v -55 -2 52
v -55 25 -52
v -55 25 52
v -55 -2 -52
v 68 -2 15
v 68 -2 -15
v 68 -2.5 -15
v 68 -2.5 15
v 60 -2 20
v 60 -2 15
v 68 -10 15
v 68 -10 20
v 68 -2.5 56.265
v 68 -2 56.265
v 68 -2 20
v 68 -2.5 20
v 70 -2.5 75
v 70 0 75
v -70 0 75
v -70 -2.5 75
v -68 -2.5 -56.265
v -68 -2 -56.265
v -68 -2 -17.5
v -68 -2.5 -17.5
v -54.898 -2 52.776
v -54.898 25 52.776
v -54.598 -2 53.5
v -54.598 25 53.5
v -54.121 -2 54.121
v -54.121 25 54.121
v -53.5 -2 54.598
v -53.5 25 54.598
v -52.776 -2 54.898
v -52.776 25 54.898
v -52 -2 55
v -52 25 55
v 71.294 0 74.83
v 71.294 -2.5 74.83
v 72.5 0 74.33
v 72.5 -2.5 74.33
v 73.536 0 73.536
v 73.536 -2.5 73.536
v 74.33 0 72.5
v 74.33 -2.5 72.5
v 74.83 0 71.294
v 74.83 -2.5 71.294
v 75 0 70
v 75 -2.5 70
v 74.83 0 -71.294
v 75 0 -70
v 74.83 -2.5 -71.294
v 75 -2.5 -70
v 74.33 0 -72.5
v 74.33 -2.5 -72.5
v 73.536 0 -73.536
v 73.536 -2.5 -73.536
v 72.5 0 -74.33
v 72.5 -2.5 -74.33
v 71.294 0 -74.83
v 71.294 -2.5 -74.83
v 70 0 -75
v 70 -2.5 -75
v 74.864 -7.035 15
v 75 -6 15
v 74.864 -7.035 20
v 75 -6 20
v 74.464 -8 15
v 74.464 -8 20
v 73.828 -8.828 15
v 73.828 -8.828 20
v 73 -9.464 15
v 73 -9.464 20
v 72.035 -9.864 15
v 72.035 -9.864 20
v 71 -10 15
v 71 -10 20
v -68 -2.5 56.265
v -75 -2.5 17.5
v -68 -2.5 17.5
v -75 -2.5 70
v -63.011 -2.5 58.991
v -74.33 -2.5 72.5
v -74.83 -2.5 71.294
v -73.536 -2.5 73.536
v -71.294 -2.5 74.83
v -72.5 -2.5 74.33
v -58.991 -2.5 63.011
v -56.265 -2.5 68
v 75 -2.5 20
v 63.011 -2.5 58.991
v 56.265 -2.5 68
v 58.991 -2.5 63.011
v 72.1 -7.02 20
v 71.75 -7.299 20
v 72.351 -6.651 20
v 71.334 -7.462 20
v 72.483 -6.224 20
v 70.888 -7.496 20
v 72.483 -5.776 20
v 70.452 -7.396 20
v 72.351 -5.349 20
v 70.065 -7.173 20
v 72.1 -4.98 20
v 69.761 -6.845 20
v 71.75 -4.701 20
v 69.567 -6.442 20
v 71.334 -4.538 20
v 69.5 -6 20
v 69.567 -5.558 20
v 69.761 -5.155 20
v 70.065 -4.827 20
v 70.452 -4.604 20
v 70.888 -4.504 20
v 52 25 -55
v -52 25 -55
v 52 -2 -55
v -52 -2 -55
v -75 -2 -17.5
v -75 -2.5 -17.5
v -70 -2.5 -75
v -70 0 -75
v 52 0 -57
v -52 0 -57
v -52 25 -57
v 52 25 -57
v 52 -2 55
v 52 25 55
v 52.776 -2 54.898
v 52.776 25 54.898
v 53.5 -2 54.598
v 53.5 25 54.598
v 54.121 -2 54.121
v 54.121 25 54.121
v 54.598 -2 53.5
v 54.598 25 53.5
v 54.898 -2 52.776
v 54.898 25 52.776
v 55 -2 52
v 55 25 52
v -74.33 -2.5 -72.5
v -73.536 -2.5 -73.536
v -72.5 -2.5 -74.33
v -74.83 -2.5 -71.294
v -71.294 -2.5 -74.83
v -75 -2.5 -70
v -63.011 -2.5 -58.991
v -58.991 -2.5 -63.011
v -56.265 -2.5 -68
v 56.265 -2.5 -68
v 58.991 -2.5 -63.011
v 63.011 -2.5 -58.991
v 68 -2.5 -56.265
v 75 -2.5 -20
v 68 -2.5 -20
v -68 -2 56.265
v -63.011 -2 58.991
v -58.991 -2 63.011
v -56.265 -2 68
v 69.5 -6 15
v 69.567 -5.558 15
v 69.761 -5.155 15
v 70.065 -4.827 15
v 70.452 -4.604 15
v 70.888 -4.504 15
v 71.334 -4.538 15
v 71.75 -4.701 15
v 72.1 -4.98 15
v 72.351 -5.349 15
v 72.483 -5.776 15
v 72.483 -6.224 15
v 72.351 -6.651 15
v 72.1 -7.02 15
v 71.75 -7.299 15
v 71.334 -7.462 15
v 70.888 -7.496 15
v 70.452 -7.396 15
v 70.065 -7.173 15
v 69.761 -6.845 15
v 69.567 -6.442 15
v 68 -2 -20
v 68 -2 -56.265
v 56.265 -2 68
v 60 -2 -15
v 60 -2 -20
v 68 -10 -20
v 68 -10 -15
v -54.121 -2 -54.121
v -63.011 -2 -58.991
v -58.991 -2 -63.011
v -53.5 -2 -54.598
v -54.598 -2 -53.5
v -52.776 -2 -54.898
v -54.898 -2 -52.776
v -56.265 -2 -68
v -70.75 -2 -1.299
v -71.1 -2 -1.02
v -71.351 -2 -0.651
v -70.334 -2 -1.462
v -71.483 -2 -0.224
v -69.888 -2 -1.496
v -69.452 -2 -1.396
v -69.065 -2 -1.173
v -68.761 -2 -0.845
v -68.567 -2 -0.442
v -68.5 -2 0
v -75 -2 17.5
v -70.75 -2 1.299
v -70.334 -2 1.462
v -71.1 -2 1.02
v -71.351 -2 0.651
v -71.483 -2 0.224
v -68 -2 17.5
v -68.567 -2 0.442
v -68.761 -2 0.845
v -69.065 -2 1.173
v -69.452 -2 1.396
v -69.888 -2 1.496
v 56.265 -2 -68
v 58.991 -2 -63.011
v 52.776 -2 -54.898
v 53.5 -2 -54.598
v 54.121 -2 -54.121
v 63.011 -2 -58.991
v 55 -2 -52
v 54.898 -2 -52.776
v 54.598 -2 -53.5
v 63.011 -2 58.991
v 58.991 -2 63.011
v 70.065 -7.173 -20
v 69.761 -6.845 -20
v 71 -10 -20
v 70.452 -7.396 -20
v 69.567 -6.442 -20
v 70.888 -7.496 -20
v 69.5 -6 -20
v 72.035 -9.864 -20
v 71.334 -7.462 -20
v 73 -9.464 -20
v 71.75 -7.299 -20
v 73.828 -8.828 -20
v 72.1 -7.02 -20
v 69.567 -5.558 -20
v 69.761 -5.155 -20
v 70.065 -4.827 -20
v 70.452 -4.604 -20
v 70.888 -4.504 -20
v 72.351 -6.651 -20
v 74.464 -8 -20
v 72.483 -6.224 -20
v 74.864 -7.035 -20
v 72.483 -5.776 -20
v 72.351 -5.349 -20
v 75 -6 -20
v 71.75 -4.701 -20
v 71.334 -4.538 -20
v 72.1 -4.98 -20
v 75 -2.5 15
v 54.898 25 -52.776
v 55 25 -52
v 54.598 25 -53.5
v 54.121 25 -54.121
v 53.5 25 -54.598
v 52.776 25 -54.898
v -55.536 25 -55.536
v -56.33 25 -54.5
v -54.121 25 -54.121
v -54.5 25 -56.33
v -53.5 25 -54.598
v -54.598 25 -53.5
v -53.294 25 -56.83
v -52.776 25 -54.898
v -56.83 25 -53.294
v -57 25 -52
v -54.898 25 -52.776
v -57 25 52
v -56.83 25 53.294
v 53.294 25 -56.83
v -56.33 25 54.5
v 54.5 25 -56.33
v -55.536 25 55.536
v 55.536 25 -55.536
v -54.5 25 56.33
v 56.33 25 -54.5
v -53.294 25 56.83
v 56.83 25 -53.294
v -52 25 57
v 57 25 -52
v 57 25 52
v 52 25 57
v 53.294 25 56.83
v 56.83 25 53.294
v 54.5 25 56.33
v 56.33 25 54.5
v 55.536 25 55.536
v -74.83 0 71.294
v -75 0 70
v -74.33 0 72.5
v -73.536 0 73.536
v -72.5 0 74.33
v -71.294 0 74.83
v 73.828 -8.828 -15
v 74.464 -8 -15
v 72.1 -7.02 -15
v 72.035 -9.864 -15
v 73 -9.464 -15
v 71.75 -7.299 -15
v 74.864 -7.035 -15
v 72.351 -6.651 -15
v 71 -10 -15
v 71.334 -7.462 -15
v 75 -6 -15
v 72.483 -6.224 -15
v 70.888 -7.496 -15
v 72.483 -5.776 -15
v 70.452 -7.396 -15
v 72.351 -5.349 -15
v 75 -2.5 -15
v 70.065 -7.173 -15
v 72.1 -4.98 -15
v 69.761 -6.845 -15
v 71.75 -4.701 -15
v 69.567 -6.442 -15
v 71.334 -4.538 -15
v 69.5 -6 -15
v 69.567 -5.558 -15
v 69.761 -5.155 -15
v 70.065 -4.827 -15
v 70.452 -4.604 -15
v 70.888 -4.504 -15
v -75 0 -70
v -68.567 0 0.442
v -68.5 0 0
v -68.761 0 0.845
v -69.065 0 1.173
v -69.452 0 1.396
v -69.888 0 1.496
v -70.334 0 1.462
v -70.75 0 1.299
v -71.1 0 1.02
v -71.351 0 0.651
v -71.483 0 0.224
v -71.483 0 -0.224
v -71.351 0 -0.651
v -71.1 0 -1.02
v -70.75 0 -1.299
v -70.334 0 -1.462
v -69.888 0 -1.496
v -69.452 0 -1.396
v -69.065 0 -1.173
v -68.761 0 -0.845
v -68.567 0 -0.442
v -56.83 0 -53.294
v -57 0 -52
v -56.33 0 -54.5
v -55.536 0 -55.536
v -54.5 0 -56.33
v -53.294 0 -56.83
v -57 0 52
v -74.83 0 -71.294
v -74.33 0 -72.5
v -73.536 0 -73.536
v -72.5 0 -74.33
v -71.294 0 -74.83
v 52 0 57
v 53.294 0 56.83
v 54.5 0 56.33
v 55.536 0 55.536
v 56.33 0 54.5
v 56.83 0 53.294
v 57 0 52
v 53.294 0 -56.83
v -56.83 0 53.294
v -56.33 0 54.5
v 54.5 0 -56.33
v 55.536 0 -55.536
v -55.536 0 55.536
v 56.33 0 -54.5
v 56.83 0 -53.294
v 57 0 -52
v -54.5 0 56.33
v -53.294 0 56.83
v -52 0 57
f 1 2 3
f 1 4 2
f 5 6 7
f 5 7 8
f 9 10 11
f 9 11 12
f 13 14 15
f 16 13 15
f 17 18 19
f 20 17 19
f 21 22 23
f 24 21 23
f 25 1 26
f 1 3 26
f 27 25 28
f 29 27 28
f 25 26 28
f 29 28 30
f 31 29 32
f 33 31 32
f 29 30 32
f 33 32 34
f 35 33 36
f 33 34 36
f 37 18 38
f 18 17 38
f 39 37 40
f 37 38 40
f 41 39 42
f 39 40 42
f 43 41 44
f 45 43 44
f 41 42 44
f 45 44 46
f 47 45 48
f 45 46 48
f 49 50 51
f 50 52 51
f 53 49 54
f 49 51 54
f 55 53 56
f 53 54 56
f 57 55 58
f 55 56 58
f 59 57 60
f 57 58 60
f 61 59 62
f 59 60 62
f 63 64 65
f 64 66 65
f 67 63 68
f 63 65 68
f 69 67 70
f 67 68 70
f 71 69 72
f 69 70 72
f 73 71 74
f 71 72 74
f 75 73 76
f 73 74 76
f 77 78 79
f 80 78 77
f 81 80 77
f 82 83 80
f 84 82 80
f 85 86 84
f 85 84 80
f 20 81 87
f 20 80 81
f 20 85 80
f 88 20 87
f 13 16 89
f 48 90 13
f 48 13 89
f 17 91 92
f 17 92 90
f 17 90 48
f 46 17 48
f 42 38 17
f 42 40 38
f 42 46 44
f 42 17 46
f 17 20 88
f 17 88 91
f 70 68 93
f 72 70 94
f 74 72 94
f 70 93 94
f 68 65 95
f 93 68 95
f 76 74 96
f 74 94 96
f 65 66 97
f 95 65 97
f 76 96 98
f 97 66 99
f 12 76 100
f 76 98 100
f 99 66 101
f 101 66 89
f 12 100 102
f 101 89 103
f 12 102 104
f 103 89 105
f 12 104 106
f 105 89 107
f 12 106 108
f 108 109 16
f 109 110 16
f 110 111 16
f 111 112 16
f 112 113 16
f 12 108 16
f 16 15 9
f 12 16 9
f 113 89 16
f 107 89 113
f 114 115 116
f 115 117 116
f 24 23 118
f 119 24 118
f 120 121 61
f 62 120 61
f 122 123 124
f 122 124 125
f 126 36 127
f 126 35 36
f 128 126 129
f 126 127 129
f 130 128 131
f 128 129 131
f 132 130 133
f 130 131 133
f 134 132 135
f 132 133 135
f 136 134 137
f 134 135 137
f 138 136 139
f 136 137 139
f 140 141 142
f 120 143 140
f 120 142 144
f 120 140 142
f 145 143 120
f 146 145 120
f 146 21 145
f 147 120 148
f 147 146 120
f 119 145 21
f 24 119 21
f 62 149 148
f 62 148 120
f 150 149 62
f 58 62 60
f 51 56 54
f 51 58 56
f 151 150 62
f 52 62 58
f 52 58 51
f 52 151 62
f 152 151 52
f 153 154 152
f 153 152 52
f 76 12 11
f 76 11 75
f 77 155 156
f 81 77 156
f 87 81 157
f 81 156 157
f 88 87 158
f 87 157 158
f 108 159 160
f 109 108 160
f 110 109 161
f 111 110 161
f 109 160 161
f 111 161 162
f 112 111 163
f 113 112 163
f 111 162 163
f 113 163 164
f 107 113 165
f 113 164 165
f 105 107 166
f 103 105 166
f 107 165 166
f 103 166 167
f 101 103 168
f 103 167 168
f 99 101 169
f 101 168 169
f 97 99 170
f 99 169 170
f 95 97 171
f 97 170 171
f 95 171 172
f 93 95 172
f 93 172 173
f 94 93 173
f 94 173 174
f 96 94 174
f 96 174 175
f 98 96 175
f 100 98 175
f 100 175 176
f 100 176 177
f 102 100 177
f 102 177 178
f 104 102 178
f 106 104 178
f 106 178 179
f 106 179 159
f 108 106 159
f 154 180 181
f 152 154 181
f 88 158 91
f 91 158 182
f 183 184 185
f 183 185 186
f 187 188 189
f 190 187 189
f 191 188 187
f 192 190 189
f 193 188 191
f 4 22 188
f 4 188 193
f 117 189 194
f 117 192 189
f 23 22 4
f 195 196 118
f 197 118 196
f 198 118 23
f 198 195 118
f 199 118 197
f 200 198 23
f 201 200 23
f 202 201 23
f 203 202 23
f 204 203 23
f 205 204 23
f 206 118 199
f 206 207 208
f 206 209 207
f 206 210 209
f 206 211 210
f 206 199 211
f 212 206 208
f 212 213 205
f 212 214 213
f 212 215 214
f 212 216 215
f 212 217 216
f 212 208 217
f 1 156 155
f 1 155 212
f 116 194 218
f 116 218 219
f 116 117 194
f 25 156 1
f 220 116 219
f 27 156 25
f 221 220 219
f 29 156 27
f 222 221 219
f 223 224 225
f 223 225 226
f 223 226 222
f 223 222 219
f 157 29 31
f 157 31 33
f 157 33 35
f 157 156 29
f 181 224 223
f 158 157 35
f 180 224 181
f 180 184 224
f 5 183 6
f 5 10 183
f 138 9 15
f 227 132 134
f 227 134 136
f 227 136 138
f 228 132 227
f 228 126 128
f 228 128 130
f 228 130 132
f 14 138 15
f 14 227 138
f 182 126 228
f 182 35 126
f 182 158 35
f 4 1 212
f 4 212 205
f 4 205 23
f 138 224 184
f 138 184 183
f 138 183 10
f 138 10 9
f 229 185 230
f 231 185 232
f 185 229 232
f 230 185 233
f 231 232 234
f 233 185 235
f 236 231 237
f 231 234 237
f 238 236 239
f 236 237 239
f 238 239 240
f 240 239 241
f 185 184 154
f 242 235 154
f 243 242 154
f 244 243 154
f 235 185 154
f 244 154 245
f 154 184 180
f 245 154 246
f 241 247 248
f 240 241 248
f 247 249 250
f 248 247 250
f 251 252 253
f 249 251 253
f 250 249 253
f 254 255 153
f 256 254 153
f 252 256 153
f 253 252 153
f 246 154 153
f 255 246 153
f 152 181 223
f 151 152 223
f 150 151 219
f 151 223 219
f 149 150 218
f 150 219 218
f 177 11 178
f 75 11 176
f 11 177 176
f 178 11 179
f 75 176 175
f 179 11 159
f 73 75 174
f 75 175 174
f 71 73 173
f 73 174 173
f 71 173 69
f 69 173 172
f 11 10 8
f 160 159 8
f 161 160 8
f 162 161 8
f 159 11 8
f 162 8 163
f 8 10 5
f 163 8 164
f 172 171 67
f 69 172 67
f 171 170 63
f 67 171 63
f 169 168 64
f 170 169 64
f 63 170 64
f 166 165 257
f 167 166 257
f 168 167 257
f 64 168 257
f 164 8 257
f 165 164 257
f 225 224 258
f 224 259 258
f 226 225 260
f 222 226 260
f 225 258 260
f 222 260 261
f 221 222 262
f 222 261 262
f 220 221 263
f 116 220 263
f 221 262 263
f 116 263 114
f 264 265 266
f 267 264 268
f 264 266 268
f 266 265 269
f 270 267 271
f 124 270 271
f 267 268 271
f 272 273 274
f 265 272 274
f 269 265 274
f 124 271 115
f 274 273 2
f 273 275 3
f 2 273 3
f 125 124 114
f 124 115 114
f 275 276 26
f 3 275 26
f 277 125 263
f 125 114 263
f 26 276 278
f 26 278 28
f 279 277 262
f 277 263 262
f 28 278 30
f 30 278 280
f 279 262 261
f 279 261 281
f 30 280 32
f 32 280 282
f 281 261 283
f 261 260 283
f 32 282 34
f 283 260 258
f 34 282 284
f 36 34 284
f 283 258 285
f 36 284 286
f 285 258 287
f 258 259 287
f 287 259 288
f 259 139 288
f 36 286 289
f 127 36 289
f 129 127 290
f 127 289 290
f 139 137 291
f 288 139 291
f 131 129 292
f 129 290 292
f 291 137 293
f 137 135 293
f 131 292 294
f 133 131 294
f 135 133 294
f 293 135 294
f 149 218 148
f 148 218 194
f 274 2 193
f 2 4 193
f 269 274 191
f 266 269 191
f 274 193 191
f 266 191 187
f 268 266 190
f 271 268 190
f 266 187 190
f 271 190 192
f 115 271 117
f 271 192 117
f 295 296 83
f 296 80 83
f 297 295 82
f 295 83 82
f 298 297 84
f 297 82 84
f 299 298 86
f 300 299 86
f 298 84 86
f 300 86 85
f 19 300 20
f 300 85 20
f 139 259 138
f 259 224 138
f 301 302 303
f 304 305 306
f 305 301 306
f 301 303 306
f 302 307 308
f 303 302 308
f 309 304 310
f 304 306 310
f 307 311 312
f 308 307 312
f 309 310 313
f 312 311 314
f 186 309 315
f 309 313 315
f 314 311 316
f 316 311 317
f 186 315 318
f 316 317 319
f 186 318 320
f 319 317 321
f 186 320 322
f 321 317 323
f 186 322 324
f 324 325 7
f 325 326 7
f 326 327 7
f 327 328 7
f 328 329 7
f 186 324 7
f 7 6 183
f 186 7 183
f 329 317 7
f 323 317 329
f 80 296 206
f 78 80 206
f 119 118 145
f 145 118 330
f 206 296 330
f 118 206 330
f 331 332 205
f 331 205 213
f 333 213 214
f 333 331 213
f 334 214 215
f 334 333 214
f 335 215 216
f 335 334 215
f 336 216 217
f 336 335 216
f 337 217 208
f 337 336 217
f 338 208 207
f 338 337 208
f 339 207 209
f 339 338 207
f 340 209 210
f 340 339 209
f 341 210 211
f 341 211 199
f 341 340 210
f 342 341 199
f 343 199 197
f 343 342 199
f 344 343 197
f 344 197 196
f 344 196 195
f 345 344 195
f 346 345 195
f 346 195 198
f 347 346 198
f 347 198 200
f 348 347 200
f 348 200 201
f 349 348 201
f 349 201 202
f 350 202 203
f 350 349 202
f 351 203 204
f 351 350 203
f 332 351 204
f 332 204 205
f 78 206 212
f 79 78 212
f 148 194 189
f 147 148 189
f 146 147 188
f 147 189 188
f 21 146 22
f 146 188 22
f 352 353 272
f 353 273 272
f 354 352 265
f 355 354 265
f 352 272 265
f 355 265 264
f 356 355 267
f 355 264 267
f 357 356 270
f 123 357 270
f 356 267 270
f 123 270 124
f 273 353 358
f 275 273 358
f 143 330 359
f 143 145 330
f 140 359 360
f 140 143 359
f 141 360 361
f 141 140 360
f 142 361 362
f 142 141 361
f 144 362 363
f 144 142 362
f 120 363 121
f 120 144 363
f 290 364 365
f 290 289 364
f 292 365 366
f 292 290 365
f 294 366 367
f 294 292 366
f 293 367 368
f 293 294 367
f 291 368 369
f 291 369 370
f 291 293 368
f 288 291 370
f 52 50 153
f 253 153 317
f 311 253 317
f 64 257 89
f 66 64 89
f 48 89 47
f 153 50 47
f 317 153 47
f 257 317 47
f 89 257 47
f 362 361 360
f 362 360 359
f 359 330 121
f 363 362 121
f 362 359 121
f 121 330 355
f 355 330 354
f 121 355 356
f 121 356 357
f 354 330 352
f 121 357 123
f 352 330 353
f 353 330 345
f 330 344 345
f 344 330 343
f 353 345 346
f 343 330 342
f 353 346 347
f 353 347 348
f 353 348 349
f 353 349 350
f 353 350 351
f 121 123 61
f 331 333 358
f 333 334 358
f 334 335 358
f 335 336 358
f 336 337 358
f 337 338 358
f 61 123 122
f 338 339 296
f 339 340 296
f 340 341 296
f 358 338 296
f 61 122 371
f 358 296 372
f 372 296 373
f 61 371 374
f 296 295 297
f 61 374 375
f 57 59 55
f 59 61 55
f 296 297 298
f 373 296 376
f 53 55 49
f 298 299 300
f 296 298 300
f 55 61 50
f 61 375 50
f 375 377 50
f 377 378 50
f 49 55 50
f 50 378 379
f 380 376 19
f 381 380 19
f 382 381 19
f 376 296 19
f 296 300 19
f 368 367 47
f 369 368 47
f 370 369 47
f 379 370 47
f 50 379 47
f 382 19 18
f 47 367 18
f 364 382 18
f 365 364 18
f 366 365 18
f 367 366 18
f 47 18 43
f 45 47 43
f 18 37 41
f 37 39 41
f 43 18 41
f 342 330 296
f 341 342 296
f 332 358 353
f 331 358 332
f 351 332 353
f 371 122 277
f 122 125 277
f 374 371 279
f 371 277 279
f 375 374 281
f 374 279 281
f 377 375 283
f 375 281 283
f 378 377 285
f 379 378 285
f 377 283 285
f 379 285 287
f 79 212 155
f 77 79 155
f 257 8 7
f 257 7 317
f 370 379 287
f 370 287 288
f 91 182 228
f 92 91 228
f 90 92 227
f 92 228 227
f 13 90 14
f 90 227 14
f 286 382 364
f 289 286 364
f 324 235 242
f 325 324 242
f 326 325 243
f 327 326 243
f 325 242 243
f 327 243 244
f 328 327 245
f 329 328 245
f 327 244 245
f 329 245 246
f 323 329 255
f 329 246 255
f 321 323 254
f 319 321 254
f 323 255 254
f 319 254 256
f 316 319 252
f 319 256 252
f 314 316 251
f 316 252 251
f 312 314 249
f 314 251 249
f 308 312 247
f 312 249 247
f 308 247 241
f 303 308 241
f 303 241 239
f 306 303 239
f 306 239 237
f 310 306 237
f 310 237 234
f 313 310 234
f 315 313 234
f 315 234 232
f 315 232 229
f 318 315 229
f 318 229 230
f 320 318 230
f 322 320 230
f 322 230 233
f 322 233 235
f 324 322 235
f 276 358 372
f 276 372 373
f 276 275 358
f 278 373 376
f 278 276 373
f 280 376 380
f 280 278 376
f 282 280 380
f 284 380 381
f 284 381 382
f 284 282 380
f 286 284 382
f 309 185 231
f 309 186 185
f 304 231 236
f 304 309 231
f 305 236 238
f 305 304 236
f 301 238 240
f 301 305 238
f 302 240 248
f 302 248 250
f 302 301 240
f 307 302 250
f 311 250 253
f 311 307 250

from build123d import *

# Parameters (mm, degrees)
F0_R     = 1.5
F0_W     = 114
F0_H     = 114
F0_W_2   = 110
F0_H_2   = 110
F1_DEPTH = 2
F0_W_3   = 7
F0_H_3   = 30
F2_DEPTH = 2.5
F0_H_4   = 5
F0_W_4   = 8
F3_DEPTH = 10
F4_SIZE  = 7.99999
F5_R     = 4
F6_DEPTH = 25
F7_R     = 3
F8_R     = 5
F10_D    = 3


# Not quite as in the source:
# - a fillet or chamfer is up to 0.001 mm smaller than in the source, because OpenCascade refuses the exact size


with BuildPart() as f1:
    # F0 (on Front) → F1 (new body)
    with BuildSketch(Plane.XZ):
        with BuildLine():
            Line((-68, 17.5), (-75, 17.5))
            Line((-75, 17.5), (-75, -17.5))
            Line((-75, -17.5), (-68, -17.5))
            Line((-68, -17.5), (-68, -56.2650060048))
            ThreePointArc((-68, -56.2650060048), (-60.8578643763, -60.8578643763), (-56.2650060048, -68))
            Line((-56.2650060048, -68), (56.2650060048, -68))
            ThreePointArc((56.2650060048, -68), (60.8578643763, -60.8578643763), (68, -56.2650060048))
            Line((68, -56.2650060048), (68, -20))
            Line((68, -20), (60, -20))
            Line((60, -20), (60, -15))
            Line((60, -15), (68, -15))
            Line((68, -15), (68, 15))
            Line((68, 15), (60, 15))
            Line((60, 15), (60, 20))
            Line((60, 20), (68, 20))
            Line((68, 20), (68, 56.2650060048))
            ThreePointArc((68, 56.2650060048), (60.8578643763, 60.8578643763), (56.2650060048, 68))
            Line((56.2650060048, 68), (-56.2650060048, 68))
            ThreePointArc((-56.2650060048, 68), (-60.8578643763, 60.8578643763), (-68, 56.2650060048))
            Line((-68, 56.2650060048), (-68, 17.5))
        make_face()
        with Locations((-70, 0)):
            Circle(F0_R, mode=Mode.SUBTRACT)
        Rectangle(F0_W, F0_H, mode=Mode.SUBTRACT)
        Rectangle(F0_W, F0_H)
        Rectangle(F0_W_2, F0_H_2, mode=Mode.SUBTRACT)
    extrude(amount=F1_DEPTH)

    # F0 (on Front) → F2 (join)
    with BuildSketch(Plane.XZ):
        with BuildLine():
            Line((-68, 68), (-68, 56.2650060048))
            ThreePointArc((-68, 56.2650060048), (-60.8578643763, 60.8578643763), (-56.2650060048, 68))
            Line((-56.2650060048, 68), (-68, 68))
        make_face()
        Polygon((75, 20), (75, 75), (-75, 75), (-75, 17.5), (-68, 17.5), (-68, 56.2650060048), (-68, 68), (-56.2650060048, 68), (56.2650060048, 68), (68, 68), (68, 56.2650060048), (68, 20), align=None)
        with BuildLine():
            ThreePointArc((56.2650060048, 68), (60.8578643763, 60.8578643763), (68, 56.2650060048))
            Line((68, 56.2650060048), (68, 68))
            Line((68, 68), (56.2650060048, 68))
        make_face()
        with BuildLine():
            Line((68, -68), (68, -56.2650060048))
            ThreePointArc((68, -56.2650060048), (60.8578643763, -60.8578643763), (56.2650060048, -68))
            Line((56.2650060048, -68), (68, -68))
        make_face()
        with BuildLine():
            ThreePointArc((-56.2650060048, -68), (-60.8578643763, -60.8578643763), (-68, -56.2650060048))
            Line((-68, -56.2650060048), (-68, -68))
            Line((-68, -68), (-56.2650060048, -68))
        make_face()
        Polygon((-68, -17.5), (-75, -17.5), (-75, -75), (75, -75), (75, -20), (68, -20), (68, -56.2650060048), (68, -68), (56.2650060048, -68), (-56.2650060048, -68), (-68, -68), (-68, -56.2650060048), align=None)
        with Locations((71.5, 0)):
            Rectangle(F0_W_3, F0_H_3)
    extrude(amount=F2_DEPTH)

    # F0 (on Front) → F3 (join)
    with BuildSketch(Plane.XZ):
        with Locations((71.5, 17.5)):
            Rectangle(F0_W_3, F0_H_4)
        with Locations((64, 17.5)):
            Rectangle(F0_W_4, F0_H_4)
        with Locations((64, -17.5)):
            Rectangle(F0_W_4, F0_H_4)
        with Locations((71.5, -17.5)):
            Rectangle(F0_W_3, F0_H_4)
    extrude(amount=F3_DEPTH)

    # F4 (size 8 in the source; OpenCascade refuses exactly that, so slightly less here)
    f4_edges = [f1.edges().sort_by_distance(p)[0] for p in [
        (60, -10, 17.5),
        (60, -10, -17.5),
    ]]
    chamfer(f4_edges, length=F4_SIZE)

    # F5
    f5_edges = [f1.edges().sort_by_distance(p)[0] for p in [
        (75, -10, 17.5),
        (75, -10, -17.5),
    ]]
    fillet(f5_edges, radius=F5_R)

    # F0 (on Front) → F6 (join)
    with BuildSketch(Plane.XZ):
        Rectangle(F0_W, F0_H)
        Rectangle(F0_W_2, F0_H_2, mode=Mode.SUBTRACT)
    extrude(amount=-F6_DEPTH)

    # F7
    f7_edges = [f1.edges().sort_by_distance(p)[0] for p in [
        (-55, 11.5, 55),
        (55, 11.5, 55),
        (55, 11.5, -55),
        (-55, 11.5, -55),
    ]]
    fillet(f7_edges, radius=F7_R)

    # F8
    f8_edges = [f1.edges().sort_by_distance(p)[0] for p in [
        (57, 12.5, 57),
        (57, 12.5, -57),
        (-57, 12.5, -57),
        (-57, 12.5, 57),
        (-75, -1.25, 75),
        (-75, -1.25, -75),
        (75, -1.25, -75),
        (75, -1.25, 75),
    ]]
    fillet(f8_edges, radius=F8_R)

    # F10 (through all)
    with Locations(Plane.XY.offset(20)):
        with Locations((71, -6)):
            Hole(F10_D / 2)


solid = f1.part
